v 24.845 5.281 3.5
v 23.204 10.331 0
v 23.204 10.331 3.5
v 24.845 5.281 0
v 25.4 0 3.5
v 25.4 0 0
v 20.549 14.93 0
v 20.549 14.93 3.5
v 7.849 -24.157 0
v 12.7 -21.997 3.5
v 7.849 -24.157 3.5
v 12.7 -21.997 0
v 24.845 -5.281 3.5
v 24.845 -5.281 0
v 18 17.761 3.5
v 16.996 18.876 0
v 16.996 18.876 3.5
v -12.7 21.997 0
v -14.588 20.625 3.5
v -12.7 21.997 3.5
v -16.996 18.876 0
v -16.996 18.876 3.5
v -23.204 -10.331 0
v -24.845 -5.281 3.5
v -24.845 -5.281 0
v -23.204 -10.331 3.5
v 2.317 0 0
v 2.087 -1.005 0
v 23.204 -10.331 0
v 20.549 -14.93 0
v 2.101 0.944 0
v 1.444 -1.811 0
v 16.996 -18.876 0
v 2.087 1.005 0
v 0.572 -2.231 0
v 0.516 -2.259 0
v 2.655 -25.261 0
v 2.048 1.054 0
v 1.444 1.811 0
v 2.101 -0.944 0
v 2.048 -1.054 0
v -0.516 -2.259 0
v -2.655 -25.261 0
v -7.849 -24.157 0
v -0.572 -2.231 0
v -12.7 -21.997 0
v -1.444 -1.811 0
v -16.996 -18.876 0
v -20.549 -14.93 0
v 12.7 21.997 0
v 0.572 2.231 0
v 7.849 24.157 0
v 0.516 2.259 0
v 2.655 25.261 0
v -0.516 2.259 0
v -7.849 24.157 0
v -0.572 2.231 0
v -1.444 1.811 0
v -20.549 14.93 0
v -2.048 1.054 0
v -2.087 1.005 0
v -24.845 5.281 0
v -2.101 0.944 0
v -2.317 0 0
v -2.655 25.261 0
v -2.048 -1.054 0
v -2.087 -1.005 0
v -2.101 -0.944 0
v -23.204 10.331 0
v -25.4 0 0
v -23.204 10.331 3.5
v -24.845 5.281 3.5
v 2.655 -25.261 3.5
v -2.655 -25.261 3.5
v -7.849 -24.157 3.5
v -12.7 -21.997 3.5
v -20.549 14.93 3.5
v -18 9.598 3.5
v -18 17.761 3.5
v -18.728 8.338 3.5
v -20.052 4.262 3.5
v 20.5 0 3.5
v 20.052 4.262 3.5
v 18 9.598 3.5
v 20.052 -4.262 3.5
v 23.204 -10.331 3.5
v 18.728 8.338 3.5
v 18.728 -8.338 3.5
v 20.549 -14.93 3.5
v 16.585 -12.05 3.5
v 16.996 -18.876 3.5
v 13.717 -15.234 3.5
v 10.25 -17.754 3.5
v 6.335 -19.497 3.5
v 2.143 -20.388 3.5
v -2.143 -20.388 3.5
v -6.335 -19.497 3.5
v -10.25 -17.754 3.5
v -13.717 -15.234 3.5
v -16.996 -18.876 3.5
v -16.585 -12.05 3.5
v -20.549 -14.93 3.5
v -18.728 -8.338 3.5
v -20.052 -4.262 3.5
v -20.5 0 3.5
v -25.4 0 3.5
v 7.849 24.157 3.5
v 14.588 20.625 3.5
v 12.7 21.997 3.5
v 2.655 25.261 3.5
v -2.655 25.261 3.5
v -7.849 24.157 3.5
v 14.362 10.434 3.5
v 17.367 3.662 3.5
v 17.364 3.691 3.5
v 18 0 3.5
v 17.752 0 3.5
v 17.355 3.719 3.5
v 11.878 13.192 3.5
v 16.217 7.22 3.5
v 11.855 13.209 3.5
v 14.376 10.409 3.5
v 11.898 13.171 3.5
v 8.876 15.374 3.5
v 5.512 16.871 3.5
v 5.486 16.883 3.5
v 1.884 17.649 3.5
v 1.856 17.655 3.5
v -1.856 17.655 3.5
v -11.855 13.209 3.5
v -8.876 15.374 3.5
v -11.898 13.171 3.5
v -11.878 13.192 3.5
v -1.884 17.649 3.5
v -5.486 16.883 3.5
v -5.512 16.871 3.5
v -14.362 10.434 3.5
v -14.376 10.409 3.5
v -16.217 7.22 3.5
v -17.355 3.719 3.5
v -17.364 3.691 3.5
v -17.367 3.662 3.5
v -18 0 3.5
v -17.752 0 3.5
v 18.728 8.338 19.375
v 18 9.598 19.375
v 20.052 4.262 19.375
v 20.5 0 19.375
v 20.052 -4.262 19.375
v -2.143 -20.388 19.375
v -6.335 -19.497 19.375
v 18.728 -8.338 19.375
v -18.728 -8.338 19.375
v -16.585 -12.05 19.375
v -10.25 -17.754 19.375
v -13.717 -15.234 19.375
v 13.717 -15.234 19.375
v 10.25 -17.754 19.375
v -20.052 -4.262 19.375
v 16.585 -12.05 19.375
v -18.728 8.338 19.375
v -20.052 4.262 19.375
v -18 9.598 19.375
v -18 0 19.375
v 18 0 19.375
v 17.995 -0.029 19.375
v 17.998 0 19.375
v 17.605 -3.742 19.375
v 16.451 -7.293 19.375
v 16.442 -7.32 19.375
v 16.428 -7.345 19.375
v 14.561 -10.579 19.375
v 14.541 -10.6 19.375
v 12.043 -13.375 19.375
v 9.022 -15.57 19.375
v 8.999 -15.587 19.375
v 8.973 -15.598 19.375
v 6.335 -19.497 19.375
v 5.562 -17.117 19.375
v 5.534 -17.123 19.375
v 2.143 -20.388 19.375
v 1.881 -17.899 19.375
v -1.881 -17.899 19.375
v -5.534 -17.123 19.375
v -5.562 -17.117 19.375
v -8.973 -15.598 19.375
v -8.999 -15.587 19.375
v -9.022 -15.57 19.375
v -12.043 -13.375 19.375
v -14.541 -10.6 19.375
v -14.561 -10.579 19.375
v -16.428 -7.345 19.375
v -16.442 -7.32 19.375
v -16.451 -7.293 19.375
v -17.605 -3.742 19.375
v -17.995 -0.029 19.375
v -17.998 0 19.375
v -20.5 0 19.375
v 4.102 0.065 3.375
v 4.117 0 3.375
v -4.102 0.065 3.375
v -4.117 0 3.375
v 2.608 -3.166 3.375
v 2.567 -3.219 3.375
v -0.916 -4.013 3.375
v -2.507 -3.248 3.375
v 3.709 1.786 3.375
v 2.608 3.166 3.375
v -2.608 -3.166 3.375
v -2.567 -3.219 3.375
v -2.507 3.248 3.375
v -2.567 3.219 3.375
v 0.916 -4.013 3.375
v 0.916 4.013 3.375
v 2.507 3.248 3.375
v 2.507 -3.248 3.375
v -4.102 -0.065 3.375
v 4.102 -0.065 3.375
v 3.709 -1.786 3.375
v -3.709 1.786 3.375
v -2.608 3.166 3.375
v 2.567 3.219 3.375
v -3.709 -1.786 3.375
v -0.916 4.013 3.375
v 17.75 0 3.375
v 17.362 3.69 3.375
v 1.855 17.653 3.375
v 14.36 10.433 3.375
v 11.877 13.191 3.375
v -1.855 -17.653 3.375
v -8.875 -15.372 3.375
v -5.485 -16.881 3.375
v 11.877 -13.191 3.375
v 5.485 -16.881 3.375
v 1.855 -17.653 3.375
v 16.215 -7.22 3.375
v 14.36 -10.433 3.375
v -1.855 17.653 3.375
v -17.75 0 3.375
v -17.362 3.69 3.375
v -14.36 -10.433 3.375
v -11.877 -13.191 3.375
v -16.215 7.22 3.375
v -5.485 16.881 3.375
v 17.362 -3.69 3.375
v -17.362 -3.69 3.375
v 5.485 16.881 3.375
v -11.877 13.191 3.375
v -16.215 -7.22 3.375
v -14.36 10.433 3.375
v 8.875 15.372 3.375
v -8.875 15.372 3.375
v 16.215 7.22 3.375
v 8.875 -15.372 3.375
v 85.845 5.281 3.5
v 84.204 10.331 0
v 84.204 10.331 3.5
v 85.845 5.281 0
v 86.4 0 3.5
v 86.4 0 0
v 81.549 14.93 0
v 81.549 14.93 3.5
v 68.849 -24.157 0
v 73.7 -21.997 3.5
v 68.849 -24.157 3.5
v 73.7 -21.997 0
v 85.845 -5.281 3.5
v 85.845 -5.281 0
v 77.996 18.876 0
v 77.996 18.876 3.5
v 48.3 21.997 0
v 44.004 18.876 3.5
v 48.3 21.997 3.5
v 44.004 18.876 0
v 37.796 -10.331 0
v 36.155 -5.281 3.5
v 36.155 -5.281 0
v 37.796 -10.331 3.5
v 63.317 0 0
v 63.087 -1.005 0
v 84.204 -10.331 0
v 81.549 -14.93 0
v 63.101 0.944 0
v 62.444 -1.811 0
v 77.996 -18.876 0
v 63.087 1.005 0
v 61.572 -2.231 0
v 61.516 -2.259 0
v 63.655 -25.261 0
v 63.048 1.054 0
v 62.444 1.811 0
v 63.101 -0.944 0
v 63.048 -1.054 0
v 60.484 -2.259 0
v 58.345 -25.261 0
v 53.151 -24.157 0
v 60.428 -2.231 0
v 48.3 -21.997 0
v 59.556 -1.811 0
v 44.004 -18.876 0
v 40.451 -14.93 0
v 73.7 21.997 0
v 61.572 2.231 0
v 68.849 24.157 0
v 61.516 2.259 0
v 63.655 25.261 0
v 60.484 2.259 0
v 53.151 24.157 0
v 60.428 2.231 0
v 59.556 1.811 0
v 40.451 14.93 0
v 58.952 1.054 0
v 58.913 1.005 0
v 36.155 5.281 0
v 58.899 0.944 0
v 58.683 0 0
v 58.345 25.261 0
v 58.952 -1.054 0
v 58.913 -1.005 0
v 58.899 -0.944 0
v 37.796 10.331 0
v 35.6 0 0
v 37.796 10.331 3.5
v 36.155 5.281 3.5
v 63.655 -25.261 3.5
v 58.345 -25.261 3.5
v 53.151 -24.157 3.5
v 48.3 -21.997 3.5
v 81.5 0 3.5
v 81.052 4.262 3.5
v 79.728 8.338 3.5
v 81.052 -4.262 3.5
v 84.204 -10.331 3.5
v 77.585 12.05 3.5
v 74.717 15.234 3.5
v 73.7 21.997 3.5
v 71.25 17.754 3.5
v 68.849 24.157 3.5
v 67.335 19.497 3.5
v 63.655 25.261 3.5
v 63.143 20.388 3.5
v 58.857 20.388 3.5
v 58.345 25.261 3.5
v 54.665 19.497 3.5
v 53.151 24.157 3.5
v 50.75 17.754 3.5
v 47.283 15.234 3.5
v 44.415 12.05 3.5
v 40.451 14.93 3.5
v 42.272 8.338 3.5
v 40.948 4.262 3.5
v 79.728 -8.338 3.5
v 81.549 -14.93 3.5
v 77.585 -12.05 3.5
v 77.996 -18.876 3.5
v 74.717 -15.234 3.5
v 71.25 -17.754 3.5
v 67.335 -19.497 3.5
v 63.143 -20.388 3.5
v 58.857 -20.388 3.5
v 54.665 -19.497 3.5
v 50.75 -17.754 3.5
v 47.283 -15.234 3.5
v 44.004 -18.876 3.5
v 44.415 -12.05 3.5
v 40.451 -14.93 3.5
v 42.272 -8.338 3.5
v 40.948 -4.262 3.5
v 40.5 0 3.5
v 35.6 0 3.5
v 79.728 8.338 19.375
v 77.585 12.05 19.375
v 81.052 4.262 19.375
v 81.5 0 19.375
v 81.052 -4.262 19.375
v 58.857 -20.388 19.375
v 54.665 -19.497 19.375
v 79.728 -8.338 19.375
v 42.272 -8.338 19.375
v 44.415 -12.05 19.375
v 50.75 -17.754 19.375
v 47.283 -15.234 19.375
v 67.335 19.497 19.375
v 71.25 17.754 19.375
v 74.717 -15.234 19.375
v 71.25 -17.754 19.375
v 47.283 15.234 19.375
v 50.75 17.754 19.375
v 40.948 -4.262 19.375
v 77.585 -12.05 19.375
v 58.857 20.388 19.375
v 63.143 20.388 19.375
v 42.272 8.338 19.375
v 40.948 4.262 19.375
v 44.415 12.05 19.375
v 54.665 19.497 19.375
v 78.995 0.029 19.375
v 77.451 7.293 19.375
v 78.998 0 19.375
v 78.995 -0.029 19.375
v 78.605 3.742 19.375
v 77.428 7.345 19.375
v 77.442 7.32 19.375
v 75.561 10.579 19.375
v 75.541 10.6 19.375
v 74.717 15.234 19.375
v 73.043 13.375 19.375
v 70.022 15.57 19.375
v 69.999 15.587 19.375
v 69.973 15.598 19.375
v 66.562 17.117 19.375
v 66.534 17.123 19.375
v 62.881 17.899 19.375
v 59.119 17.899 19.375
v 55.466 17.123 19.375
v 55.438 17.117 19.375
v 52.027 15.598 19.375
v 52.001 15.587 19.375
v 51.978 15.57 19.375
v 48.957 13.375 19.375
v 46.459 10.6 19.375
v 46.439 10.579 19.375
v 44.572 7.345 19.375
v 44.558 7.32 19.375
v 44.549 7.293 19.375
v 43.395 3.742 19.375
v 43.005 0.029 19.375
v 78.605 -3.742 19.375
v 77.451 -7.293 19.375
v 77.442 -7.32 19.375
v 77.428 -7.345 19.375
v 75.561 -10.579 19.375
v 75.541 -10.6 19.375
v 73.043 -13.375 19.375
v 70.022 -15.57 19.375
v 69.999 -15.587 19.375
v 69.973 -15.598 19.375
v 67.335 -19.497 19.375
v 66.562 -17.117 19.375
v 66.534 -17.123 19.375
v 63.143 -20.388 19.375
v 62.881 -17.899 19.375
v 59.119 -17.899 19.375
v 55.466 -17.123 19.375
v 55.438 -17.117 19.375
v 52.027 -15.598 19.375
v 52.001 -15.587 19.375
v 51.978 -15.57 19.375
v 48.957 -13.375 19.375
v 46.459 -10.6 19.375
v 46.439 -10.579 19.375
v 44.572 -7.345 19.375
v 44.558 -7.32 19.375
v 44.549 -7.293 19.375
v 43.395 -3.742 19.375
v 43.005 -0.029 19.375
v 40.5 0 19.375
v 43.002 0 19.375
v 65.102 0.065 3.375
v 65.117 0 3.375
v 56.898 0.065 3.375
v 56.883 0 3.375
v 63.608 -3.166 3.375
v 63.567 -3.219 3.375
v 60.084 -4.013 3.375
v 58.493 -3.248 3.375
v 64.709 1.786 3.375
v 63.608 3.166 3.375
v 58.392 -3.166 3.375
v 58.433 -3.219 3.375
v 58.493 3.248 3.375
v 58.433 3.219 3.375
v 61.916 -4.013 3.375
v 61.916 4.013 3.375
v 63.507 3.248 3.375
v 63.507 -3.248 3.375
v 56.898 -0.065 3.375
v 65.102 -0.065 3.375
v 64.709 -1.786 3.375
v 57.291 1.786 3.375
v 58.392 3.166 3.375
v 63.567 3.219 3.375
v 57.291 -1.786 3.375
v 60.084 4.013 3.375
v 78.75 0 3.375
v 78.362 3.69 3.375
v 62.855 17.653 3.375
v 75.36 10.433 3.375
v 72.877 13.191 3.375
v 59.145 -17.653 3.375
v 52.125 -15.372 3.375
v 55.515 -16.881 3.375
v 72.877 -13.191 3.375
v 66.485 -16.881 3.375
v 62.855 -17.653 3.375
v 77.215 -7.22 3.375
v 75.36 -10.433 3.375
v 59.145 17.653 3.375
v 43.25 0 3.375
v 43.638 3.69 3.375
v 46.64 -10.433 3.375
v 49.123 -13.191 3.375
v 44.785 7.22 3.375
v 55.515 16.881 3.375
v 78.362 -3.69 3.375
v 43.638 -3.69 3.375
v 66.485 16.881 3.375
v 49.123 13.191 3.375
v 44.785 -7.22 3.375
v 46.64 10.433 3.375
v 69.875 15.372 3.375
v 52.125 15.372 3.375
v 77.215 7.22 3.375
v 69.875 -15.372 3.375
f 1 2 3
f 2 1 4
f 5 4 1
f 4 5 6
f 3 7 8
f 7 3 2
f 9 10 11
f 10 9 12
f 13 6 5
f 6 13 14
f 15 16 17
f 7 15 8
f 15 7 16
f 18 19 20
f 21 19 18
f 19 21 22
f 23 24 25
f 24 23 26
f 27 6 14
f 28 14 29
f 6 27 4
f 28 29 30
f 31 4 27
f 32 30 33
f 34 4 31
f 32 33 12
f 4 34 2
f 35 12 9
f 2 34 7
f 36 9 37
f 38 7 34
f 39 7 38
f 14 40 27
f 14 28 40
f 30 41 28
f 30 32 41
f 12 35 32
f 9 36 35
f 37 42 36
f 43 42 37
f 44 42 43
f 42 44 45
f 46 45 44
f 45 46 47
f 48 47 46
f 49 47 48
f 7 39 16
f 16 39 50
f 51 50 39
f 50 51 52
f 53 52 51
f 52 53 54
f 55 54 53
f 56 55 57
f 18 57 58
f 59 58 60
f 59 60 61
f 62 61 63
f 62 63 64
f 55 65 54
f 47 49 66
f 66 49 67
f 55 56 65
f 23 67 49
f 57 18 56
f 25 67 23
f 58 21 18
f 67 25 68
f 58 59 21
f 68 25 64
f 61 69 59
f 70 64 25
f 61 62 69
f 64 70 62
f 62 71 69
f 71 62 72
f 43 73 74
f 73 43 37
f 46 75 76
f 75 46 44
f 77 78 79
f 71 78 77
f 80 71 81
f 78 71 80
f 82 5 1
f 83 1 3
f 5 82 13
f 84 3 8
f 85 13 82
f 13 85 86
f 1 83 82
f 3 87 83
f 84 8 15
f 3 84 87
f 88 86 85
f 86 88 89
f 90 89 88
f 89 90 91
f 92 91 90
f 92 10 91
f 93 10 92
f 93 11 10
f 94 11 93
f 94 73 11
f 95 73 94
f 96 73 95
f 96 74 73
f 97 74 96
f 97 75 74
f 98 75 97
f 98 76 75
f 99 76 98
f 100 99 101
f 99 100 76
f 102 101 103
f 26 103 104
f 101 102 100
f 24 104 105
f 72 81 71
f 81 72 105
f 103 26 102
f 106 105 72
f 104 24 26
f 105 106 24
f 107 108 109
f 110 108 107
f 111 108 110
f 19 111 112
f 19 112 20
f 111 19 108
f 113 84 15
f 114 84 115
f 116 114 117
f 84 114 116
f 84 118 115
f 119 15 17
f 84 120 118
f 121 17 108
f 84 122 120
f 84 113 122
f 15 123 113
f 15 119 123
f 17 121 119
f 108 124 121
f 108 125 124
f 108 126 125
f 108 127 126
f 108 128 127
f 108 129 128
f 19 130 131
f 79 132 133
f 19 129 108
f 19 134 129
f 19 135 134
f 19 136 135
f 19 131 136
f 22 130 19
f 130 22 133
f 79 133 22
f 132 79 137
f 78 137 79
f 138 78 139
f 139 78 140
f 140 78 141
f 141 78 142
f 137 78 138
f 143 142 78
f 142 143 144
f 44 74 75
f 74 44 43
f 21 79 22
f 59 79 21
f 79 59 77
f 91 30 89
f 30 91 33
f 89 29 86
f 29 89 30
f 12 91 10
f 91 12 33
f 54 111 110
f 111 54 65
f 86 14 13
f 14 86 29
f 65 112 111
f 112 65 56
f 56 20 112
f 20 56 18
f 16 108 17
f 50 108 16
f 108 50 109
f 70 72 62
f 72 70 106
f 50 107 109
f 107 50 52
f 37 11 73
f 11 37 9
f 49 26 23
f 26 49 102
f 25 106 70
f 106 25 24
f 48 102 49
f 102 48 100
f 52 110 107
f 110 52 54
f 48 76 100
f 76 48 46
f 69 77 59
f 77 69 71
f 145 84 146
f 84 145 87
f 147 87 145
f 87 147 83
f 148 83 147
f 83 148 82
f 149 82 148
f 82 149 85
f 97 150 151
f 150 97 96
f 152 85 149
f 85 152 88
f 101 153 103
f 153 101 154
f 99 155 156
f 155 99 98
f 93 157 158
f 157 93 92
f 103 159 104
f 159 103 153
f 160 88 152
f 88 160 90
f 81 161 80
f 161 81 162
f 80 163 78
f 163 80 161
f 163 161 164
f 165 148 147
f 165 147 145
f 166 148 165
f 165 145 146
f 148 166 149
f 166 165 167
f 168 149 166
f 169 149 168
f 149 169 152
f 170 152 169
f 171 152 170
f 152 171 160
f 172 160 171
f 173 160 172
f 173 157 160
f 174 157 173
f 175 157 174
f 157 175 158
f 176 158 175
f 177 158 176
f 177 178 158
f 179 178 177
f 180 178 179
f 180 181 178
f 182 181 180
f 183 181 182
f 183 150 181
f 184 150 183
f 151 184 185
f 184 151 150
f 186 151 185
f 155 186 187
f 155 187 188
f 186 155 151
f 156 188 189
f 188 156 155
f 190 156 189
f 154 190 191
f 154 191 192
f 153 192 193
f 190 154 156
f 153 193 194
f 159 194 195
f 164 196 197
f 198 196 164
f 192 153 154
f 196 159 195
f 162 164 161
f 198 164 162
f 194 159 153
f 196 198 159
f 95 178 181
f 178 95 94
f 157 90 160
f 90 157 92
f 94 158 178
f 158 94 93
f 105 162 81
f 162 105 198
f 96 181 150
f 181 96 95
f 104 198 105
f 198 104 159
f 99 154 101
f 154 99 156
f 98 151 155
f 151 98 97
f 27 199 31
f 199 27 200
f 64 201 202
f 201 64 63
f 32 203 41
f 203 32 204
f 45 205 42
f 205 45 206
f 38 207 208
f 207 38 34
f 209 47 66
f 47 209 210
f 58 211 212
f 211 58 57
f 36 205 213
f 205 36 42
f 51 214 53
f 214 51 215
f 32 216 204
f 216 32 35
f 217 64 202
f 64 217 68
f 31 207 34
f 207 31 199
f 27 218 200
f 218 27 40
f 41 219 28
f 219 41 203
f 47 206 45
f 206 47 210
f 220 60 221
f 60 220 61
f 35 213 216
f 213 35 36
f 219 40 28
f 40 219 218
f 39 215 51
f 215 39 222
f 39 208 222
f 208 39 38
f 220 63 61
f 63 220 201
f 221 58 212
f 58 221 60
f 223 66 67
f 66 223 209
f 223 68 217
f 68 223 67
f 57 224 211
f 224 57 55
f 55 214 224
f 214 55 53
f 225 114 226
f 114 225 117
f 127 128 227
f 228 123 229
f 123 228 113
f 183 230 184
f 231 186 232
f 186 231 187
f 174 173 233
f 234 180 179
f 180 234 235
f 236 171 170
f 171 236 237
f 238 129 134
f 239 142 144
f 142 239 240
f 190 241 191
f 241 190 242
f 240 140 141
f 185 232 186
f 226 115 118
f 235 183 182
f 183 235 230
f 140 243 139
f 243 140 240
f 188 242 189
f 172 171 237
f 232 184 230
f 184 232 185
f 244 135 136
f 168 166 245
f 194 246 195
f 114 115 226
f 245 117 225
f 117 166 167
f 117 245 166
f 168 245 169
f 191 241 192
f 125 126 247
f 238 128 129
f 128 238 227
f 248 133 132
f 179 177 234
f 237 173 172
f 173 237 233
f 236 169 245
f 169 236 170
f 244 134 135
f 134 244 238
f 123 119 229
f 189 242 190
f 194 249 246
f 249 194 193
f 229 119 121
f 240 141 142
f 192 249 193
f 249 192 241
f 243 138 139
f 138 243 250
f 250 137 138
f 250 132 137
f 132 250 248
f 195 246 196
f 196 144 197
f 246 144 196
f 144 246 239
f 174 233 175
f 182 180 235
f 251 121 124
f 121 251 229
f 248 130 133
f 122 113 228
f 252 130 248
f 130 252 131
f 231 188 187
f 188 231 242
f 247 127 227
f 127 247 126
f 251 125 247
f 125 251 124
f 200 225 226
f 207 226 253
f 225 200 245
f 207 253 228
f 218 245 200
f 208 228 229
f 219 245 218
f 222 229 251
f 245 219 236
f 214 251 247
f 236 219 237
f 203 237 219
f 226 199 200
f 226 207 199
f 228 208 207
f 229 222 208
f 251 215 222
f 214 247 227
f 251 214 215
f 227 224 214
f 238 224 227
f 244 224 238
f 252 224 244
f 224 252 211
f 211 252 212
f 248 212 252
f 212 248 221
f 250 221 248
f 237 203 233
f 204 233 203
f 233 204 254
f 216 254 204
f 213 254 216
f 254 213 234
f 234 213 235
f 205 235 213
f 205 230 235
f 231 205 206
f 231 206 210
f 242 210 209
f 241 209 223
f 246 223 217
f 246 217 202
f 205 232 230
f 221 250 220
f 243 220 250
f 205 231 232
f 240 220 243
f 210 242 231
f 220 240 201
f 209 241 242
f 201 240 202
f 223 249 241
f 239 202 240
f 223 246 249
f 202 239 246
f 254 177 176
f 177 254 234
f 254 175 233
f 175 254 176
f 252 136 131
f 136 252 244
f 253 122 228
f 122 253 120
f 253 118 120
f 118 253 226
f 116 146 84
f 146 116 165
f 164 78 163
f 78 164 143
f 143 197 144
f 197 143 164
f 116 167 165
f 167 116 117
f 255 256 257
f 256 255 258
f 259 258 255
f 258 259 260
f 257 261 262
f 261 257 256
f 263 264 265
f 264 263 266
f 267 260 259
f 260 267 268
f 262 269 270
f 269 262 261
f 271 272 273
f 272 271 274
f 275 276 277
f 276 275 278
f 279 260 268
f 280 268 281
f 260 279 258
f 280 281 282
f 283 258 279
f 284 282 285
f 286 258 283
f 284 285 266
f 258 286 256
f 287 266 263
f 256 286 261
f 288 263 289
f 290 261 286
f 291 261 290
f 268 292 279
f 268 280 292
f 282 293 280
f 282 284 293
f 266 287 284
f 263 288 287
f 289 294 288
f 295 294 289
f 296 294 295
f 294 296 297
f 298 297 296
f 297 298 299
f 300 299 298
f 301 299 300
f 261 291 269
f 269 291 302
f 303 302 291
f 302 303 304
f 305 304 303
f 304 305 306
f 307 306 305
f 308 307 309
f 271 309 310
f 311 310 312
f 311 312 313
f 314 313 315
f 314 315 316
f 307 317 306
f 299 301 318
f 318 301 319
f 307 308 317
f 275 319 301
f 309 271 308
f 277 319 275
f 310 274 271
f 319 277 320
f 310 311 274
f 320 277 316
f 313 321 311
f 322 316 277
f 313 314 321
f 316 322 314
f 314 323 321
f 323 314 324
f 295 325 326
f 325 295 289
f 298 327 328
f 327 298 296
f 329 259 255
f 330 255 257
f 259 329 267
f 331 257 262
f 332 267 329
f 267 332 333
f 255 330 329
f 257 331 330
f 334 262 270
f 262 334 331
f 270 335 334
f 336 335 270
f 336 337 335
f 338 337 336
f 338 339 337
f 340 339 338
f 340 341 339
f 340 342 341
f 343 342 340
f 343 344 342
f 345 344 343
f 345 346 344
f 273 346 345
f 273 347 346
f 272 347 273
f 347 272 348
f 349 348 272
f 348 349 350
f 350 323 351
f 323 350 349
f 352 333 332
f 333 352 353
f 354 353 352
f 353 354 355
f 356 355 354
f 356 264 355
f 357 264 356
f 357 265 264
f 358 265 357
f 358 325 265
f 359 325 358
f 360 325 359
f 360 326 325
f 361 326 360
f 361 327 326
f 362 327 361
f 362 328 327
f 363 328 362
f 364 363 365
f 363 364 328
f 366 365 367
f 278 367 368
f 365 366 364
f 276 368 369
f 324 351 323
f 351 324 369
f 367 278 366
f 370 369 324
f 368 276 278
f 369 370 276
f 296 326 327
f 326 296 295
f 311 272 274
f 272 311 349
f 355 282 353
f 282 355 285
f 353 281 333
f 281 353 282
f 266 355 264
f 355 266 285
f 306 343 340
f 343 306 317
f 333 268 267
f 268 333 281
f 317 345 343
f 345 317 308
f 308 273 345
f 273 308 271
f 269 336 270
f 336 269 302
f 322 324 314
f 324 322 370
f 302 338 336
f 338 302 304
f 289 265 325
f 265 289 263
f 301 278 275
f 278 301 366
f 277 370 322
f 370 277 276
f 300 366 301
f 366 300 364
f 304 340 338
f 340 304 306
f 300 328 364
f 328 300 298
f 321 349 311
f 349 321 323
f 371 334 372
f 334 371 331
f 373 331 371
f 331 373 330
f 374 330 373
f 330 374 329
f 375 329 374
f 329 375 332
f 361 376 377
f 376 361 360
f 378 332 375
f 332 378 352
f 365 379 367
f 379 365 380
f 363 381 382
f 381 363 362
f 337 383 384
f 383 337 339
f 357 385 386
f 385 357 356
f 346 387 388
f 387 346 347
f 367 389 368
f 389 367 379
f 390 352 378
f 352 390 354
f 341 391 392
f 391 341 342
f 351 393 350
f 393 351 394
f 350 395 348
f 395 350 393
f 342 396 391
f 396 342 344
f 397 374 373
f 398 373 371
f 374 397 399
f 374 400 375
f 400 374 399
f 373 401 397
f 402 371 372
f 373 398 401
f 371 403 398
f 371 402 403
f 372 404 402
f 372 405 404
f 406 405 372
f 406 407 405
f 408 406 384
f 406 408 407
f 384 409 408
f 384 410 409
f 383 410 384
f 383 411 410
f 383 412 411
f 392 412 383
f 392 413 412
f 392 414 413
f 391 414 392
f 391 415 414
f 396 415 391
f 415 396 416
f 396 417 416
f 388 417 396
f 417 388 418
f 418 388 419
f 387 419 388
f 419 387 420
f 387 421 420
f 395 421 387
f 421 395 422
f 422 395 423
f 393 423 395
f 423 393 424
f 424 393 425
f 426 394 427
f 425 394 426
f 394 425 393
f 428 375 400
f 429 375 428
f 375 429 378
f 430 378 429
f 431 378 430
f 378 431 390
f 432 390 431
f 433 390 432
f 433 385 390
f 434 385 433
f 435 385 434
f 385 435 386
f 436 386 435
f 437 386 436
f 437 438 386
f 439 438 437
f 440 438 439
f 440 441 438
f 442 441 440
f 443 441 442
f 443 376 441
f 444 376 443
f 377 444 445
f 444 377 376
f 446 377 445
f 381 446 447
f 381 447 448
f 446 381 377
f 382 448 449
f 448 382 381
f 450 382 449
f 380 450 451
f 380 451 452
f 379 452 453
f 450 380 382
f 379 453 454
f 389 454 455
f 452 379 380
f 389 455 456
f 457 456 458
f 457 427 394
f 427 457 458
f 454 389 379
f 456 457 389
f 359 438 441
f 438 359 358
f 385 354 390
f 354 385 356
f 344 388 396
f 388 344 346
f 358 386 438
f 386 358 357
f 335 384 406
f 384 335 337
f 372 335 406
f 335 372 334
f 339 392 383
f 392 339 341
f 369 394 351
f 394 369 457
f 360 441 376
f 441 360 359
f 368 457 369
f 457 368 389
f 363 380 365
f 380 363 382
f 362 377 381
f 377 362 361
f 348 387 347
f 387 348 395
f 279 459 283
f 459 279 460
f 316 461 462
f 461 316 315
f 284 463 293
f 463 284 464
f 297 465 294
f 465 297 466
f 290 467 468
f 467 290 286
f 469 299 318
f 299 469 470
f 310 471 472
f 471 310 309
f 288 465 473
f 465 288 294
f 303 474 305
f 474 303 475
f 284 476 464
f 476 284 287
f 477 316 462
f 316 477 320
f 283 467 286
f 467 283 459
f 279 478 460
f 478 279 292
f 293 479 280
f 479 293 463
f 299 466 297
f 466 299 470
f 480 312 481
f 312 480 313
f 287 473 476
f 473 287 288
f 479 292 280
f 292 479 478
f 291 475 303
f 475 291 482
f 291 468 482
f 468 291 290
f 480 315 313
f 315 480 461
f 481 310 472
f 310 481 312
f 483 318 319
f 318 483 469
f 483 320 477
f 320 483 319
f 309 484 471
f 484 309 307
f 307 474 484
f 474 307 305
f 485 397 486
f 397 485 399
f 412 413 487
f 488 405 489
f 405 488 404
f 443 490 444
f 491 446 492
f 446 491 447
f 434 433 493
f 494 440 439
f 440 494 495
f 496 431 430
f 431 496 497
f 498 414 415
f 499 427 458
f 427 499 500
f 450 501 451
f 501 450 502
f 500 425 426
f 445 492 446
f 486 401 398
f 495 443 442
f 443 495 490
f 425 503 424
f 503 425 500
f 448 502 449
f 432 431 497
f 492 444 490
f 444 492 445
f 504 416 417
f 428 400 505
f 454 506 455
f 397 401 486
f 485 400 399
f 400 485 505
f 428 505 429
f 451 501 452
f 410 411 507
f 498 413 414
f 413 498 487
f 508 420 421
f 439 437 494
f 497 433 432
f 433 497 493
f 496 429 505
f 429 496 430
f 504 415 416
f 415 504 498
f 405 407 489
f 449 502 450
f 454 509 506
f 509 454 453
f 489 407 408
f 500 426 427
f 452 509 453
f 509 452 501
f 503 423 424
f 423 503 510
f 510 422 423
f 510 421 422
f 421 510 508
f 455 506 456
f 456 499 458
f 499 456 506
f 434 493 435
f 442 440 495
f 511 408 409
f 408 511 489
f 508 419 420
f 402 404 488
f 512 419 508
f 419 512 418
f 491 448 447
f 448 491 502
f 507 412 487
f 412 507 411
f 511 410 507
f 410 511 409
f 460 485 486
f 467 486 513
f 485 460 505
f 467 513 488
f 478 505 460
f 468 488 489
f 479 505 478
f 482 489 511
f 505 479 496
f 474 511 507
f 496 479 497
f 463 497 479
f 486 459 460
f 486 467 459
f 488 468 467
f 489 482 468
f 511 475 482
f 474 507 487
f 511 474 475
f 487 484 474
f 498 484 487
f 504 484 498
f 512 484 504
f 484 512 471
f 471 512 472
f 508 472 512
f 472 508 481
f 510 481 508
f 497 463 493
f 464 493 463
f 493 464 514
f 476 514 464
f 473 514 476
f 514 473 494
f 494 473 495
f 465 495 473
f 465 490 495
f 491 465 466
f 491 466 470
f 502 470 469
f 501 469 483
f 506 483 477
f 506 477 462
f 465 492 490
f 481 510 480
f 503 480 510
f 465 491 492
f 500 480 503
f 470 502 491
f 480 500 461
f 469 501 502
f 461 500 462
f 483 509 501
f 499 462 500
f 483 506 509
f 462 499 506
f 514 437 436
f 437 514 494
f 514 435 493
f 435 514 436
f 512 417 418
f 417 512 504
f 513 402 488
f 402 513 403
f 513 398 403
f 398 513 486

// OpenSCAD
goldenratio = 1.61803399;
joinfactor = 0.125;

//closedSocket();
//halfSocket();
PoleSocketSet();

module closedSocket()
{
	baseRadius = 2/2*25.4;
	baseThickness = 3.5;
	baseSmallHole = 4.5/2;
	baseLargeHole = 8.5/2;

	socketOR = 41/2;
	socketIRBase = 35.5/2;
	socketIRTop = 36/2;
	socketHeight = 16;

	difference()
	{
		union()
		{
			cylinder(r=baseRadius, h=baseThickness);	

			translate([0,0,baseThickness-joinfactor])
			cylinder(r=socketOR, h=socketHeight);
		}

		translate([0,0,-joinfactor])
		cylinder(r1=baseSmallHole, r2 = baseLargeHole, h=baseThickness+2*joinfactor);

		translate([0,0,baseThickness-joinfactor])
		cylinder(r1=socketIRBase, r2=socketIRTop, h=socketHeight+joinfactor);
	}
}

module halfSocket()
{
	baseRadius = 2/2*25.4;
	baseThickness = 3.5;
	baseSmallHole = 4.5/2;
	baseLargeHole = 8.5/2;

	socketOR = 41/2;
	socketIRBase = 35.5/2;
	socketIRTop = 36/2;
	socketHeight = 16;

	difference()
	{
		union()
		{
			cylinder(r=baseRadius, h=baseThickness);	

			translate([0,0,baseThickness-joinfactor])
			cylinder(r=socketOR, h=socketHeight);
		}

		translate([0,0,-joinfactor])
		cylinder(r1=baseSmallHole, r2 = baseLargeHole, h=baseThickness+2*joinfactor);

		translate([0,0,baseThickness-joinfactor])
		cylinder(r1=socketIRBase, r2=socketIRTop, h=socketHeight+joinfactor);

		translate([-socketIRTop, 0, baseThickness])
		cube(size=[socketIRTop*2, socketOR+joinfactor, socketHeight]);
	}
}

module PoleSocketSet()
{
	halfSocket();
	
	translate([2.5*24.4, 0, 0])
	closedSocket();
}
